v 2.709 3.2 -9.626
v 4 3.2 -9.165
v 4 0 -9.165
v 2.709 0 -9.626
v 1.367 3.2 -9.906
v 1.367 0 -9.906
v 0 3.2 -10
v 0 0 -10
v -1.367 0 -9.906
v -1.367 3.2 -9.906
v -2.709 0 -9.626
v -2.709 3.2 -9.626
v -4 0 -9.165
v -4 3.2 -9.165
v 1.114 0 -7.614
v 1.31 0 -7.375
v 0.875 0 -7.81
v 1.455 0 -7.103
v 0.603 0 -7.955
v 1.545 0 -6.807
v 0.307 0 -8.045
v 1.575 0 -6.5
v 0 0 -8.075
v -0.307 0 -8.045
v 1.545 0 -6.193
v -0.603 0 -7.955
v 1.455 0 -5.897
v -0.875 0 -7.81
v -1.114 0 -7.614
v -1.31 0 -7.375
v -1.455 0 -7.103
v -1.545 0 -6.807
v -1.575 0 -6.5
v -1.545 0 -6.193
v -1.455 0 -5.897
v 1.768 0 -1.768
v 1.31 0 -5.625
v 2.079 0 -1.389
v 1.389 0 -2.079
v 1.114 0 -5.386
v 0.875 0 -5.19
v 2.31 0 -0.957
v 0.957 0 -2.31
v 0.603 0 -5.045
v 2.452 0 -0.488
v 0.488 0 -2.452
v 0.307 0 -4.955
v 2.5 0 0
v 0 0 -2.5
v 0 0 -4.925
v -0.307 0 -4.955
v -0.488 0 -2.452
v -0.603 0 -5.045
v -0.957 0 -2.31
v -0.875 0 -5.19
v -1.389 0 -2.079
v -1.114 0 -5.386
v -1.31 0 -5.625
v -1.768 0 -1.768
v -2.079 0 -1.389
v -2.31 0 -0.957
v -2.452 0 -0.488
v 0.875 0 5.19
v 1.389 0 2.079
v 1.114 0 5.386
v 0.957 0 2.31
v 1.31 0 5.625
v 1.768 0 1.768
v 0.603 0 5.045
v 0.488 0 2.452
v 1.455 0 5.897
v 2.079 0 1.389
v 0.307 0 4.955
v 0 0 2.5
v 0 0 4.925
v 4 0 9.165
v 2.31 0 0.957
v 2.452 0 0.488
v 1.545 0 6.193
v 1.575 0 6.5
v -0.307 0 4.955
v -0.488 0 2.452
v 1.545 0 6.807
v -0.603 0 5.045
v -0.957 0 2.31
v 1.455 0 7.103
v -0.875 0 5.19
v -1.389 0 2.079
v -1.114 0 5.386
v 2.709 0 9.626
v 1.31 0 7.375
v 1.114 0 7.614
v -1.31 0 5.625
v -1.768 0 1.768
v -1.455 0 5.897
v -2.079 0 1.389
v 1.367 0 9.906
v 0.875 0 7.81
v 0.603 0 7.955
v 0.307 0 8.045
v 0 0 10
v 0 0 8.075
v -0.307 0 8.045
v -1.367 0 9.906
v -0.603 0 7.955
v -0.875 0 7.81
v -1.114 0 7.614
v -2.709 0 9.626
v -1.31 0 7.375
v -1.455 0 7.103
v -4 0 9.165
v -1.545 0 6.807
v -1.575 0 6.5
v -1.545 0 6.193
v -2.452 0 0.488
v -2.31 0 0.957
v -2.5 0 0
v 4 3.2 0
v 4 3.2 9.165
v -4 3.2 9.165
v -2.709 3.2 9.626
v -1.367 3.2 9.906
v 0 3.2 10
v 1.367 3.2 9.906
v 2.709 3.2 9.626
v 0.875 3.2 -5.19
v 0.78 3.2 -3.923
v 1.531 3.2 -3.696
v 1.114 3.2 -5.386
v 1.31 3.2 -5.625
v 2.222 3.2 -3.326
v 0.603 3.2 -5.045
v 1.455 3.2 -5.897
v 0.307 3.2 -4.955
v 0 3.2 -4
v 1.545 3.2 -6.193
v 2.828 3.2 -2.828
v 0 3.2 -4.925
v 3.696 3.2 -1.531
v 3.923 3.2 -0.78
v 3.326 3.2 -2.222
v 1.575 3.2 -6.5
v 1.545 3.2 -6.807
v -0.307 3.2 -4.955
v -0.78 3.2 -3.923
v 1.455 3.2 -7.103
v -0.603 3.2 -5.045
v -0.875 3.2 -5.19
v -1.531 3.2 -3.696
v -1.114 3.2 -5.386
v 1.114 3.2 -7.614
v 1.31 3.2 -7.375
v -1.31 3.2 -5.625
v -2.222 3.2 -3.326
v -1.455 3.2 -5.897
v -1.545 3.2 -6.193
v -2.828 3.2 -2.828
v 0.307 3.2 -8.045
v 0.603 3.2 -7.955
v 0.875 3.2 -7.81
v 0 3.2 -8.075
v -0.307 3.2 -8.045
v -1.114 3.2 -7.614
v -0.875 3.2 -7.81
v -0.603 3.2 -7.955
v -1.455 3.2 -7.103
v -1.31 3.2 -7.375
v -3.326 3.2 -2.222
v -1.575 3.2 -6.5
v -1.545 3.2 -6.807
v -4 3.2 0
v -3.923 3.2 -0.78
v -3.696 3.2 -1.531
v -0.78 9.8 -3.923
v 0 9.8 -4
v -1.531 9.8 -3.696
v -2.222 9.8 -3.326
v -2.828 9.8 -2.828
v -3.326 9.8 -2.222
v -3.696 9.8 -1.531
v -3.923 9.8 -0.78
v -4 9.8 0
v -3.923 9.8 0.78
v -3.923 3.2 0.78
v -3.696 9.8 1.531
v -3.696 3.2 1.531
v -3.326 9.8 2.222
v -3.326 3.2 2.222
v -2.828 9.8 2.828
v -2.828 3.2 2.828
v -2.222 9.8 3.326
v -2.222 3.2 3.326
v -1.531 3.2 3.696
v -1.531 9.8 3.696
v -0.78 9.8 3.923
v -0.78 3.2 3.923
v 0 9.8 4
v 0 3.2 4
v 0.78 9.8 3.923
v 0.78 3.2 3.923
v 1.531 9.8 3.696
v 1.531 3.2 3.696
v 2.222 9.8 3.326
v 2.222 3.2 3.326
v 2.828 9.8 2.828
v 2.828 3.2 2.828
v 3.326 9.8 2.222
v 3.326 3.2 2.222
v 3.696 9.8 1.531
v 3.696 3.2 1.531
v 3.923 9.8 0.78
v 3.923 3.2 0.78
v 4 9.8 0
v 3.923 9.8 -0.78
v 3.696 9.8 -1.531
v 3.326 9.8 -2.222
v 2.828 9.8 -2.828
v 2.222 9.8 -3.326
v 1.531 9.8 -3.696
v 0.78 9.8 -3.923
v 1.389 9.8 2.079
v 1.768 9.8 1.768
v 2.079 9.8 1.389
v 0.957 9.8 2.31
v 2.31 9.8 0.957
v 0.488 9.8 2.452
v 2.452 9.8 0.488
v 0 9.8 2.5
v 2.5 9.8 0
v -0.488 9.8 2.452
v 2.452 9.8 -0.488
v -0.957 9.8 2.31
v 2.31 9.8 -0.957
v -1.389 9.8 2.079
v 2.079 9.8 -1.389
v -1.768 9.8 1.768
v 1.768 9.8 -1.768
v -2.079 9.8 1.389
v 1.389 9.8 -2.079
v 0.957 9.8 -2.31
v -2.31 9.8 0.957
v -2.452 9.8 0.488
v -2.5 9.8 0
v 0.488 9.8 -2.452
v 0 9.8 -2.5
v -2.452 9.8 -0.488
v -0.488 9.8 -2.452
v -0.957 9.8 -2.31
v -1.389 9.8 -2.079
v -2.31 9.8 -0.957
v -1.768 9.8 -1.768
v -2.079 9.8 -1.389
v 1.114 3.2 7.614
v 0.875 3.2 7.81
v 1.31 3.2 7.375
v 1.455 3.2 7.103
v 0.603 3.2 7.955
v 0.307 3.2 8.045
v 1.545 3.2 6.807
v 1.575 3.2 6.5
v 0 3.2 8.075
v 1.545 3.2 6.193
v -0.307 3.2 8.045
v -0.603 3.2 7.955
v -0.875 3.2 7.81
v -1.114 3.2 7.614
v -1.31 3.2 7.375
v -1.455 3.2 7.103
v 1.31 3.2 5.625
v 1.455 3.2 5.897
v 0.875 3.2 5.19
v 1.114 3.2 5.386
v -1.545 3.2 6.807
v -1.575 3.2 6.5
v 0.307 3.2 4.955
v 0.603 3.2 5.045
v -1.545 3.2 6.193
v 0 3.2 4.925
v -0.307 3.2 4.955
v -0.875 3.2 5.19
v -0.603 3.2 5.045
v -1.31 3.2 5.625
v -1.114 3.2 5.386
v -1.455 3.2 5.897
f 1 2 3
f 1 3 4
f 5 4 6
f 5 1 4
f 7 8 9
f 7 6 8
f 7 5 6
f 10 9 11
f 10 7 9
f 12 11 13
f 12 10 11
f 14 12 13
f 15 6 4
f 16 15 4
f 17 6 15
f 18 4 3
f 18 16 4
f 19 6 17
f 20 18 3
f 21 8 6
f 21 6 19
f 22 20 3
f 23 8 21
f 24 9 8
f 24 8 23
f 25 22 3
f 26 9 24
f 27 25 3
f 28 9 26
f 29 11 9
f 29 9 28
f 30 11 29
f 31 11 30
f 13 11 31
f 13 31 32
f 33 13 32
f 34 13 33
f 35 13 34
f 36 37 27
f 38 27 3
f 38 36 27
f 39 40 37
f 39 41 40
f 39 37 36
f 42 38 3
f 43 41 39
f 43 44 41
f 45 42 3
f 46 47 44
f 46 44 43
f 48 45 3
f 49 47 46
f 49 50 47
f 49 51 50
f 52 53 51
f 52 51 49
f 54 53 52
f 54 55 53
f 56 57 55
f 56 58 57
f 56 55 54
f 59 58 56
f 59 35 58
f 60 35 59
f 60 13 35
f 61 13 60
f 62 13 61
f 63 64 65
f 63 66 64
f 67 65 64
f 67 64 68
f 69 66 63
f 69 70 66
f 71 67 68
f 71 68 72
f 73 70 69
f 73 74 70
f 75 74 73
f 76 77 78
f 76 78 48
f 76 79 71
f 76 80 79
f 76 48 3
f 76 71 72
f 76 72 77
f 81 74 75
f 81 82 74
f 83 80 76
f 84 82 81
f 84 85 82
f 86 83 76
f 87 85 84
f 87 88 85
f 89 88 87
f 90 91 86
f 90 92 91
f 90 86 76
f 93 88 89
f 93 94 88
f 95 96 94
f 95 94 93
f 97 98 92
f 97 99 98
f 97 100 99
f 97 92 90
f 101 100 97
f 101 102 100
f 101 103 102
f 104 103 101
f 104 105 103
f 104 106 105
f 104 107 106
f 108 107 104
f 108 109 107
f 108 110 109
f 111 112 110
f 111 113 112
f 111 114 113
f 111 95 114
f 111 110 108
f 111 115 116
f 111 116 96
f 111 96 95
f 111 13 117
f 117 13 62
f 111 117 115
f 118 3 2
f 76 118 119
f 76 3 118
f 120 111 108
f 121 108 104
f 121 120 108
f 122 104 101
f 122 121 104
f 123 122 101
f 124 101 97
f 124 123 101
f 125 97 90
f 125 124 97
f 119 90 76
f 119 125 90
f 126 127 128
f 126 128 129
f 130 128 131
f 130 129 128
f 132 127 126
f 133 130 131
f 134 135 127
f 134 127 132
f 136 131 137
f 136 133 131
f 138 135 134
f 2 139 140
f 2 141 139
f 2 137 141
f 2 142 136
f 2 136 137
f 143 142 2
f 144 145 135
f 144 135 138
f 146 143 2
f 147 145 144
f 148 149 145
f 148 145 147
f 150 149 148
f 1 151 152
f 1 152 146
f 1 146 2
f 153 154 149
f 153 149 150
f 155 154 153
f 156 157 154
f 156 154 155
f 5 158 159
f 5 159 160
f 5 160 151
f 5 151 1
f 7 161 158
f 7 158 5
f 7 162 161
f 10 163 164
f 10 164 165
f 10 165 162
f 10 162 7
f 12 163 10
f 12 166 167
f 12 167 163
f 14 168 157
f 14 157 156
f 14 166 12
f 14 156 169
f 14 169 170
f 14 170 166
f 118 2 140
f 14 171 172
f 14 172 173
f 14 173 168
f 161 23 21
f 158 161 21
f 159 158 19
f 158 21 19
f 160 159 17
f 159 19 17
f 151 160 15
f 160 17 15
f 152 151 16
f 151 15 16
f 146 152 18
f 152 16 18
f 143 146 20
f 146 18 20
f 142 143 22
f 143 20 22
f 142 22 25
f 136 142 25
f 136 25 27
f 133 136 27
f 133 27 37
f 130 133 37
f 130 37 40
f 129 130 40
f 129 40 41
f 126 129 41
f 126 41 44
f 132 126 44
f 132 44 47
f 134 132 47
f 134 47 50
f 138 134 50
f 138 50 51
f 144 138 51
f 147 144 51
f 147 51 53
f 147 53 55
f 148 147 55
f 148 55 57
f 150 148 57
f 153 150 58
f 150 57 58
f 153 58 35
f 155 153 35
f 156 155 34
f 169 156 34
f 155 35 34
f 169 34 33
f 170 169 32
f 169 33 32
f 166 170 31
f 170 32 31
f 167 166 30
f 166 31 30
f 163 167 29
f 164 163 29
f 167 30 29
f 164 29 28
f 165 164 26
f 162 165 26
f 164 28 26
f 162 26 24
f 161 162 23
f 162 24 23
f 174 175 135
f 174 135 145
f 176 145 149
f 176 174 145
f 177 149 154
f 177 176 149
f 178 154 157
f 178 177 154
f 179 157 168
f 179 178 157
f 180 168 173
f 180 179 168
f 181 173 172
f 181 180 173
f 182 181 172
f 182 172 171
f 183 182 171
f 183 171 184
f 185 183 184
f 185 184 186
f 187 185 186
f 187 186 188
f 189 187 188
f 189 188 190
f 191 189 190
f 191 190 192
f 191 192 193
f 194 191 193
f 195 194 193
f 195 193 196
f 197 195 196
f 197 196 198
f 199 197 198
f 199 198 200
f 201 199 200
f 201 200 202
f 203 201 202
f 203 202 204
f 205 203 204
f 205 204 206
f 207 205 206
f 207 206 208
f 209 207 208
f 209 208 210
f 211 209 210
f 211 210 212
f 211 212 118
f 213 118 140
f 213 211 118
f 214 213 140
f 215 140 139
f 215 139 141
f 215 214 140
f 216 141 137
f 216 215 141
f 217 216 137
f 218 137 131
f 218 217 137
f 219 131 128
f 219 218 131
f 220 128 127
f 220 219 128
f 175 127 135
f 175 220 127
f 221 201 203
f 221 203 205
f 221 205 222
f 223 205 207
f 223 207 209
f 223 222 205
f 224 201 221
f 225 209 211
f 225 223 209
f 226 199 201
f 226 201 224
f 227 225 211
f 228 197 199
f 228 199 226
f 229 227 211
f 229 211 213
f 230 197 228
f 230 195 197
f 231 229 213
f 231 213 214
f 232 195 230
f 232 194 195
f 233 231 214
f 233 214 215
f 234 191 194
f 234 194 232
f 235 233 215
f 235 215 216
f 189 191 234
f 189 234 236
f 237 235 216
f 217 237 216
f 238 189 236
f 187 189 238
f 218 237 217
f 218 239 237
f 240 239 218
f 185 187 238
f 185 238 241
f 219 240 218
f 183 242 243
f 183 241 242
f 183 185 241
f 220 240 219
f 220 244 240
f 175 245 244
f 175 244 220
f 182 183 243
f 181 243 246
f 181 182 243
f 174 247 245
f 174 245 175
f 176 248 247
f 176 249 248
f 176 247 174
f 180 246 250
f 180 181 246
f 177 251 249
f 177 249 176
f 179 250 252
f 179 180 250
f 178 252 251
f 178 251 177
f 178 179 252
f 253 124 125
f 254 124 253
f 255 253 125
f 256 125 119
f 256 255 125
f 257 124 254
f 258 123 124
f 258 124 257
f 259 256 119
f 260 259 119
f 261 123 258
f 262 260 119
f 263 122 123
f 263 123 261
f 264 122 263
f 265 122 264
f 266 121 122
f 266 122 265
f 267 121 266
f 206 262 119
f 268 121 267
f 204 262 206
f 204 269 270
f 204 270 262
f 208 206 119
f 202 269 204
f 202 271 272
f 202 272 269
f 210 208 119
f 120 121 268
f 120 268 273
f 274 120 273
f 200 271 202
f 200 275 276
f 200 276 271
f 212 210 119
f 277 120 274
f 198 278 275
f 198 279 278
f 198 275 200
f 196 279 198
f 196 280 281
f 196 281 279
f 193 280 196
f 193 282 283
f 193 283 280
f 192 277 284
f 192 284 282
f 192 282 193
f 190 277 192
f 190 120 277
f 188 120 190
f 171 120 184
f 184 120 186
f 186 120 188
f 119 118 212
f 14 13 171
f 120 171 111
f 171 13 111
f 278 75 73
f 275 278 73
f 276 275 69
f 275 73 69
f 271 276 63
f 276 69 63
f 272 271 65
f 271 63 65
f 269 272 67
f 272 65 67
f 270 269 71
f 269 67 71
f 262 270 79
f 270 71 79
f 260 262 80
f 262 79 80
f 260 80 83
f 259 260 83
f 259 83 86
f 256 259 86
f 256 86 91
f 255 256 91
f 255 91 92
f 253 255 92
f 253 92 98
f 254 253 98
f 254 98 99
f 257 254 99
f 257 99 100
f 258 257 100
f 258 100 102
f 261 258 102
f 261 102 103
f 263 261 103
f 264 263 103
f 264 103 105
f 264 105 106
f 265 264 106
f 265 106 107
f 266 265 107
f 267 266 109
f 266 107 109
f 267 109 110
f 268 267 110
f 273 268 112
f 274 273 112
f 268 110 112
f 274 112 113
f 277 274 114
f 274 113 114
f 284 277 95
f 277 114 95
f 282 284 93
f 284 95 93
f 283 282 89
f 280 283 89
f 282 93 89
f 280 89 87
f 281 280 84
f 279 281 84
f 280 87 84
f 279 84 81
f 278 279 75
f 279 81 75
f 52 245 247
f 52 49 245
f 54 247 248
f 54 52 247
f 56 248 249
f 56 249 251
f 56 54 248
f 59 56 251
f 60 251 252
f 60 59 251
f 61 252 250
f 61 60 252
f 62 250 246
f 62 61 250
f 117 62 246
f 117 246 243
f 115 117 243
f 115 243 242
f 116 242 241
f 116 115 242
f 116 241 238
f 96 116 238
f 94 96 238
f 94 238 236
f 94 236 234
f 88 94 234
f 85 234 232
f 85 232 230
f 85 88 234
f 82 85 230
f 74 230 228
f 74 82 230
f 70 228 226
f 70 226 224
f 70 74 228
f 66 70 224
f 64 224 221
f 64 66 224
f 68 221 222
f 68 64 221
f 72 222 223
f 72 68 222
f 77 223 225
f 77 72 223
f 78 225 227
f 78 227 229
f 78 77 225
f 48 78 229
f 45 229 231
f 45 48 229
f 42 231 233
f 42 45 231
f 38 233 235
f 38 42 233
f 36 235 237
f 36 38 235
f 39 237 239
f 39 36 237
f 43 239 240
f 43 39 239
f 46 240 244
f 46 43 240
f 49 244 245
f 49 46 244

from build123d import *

# Parameters (mm, degrees)
ESQUISSE2_R             = 1.575
ENL_V_MAT_EXTRU_1_DEPTH = 18.205812971
ESQUISSE3_OUTSIDE_W     = 27.986
ESQUISSE3_OUTSIDE_H     = 27.986
ESQUISSE3_OUTSIDE_W_2   = 8
ESQUISSE3_OUTSIDE_H_2   = 20
ENL_V_MAT_EXTRU_2_DEPTH = 18.205812971


with BuildPart() as part:
    # Esquisse1 → Révolution1 (revolve)
    with BuildSketch(Plane.XY, mode=Mode.PRIVATE) as r_volution1_sk:
        Polygon((2.5, 0), (10, 0), (10, 3.2), (4, 3.2), (4, 9.8), (2.5, 9.8), align=None)
    revolve(r_volution1_sk.sketch.rotate(Axis((0, 0, 0), (0, 1, 0)), 90), axis=Axis((0, 0, 0), (0, 1, 0)))

    # Esquisse2 → Enlèv. mat.-Extru.1 (cut, through all)
    with BuildSketch(Plane.XZ):
        with Locations(Location((0, 6.5, 0), (0, 0, 270))):
            Circle(ESQUISSE2_R)
        with Locations(Location((5.629165125, -3.25, 0), (0, 0, 270))):
            Circle(ESQUISSE2_R)
        with Locations(Location((-5.629165125, -3.25, 0), (0, 0, 270))):
            Circle(ESQUISSE2_R)
        with Locations(Location((0, -6.5, 0), (0, 0, 270))):
            Circle(ESQUISSE2_R)
    extrude(amount=-ENL_V_MAT_EXTRU_1_DEPTH, mode=Mode.SUBTRACT)

    # Esquisse3 outside → Enlèv. mat.-Extru.2 (cut, through all)
    with BuildSketch(Plane.XZ):
        Rectangle(ESQUISSE3_OUTSIDE_W, ESQUISSE3_OUTSIDE_H)
        Rectangle(ESQUISSE3_OUTSIDE_W_2, ESQUISSE3_OUTSIDE_H_2, mode=Mode.SUBTRACT)
    extrude(amount=-ENL_V_MAT_EXTRU_2_DEPTH, mode=Mode.SUBTRACT)


solid = part.part
